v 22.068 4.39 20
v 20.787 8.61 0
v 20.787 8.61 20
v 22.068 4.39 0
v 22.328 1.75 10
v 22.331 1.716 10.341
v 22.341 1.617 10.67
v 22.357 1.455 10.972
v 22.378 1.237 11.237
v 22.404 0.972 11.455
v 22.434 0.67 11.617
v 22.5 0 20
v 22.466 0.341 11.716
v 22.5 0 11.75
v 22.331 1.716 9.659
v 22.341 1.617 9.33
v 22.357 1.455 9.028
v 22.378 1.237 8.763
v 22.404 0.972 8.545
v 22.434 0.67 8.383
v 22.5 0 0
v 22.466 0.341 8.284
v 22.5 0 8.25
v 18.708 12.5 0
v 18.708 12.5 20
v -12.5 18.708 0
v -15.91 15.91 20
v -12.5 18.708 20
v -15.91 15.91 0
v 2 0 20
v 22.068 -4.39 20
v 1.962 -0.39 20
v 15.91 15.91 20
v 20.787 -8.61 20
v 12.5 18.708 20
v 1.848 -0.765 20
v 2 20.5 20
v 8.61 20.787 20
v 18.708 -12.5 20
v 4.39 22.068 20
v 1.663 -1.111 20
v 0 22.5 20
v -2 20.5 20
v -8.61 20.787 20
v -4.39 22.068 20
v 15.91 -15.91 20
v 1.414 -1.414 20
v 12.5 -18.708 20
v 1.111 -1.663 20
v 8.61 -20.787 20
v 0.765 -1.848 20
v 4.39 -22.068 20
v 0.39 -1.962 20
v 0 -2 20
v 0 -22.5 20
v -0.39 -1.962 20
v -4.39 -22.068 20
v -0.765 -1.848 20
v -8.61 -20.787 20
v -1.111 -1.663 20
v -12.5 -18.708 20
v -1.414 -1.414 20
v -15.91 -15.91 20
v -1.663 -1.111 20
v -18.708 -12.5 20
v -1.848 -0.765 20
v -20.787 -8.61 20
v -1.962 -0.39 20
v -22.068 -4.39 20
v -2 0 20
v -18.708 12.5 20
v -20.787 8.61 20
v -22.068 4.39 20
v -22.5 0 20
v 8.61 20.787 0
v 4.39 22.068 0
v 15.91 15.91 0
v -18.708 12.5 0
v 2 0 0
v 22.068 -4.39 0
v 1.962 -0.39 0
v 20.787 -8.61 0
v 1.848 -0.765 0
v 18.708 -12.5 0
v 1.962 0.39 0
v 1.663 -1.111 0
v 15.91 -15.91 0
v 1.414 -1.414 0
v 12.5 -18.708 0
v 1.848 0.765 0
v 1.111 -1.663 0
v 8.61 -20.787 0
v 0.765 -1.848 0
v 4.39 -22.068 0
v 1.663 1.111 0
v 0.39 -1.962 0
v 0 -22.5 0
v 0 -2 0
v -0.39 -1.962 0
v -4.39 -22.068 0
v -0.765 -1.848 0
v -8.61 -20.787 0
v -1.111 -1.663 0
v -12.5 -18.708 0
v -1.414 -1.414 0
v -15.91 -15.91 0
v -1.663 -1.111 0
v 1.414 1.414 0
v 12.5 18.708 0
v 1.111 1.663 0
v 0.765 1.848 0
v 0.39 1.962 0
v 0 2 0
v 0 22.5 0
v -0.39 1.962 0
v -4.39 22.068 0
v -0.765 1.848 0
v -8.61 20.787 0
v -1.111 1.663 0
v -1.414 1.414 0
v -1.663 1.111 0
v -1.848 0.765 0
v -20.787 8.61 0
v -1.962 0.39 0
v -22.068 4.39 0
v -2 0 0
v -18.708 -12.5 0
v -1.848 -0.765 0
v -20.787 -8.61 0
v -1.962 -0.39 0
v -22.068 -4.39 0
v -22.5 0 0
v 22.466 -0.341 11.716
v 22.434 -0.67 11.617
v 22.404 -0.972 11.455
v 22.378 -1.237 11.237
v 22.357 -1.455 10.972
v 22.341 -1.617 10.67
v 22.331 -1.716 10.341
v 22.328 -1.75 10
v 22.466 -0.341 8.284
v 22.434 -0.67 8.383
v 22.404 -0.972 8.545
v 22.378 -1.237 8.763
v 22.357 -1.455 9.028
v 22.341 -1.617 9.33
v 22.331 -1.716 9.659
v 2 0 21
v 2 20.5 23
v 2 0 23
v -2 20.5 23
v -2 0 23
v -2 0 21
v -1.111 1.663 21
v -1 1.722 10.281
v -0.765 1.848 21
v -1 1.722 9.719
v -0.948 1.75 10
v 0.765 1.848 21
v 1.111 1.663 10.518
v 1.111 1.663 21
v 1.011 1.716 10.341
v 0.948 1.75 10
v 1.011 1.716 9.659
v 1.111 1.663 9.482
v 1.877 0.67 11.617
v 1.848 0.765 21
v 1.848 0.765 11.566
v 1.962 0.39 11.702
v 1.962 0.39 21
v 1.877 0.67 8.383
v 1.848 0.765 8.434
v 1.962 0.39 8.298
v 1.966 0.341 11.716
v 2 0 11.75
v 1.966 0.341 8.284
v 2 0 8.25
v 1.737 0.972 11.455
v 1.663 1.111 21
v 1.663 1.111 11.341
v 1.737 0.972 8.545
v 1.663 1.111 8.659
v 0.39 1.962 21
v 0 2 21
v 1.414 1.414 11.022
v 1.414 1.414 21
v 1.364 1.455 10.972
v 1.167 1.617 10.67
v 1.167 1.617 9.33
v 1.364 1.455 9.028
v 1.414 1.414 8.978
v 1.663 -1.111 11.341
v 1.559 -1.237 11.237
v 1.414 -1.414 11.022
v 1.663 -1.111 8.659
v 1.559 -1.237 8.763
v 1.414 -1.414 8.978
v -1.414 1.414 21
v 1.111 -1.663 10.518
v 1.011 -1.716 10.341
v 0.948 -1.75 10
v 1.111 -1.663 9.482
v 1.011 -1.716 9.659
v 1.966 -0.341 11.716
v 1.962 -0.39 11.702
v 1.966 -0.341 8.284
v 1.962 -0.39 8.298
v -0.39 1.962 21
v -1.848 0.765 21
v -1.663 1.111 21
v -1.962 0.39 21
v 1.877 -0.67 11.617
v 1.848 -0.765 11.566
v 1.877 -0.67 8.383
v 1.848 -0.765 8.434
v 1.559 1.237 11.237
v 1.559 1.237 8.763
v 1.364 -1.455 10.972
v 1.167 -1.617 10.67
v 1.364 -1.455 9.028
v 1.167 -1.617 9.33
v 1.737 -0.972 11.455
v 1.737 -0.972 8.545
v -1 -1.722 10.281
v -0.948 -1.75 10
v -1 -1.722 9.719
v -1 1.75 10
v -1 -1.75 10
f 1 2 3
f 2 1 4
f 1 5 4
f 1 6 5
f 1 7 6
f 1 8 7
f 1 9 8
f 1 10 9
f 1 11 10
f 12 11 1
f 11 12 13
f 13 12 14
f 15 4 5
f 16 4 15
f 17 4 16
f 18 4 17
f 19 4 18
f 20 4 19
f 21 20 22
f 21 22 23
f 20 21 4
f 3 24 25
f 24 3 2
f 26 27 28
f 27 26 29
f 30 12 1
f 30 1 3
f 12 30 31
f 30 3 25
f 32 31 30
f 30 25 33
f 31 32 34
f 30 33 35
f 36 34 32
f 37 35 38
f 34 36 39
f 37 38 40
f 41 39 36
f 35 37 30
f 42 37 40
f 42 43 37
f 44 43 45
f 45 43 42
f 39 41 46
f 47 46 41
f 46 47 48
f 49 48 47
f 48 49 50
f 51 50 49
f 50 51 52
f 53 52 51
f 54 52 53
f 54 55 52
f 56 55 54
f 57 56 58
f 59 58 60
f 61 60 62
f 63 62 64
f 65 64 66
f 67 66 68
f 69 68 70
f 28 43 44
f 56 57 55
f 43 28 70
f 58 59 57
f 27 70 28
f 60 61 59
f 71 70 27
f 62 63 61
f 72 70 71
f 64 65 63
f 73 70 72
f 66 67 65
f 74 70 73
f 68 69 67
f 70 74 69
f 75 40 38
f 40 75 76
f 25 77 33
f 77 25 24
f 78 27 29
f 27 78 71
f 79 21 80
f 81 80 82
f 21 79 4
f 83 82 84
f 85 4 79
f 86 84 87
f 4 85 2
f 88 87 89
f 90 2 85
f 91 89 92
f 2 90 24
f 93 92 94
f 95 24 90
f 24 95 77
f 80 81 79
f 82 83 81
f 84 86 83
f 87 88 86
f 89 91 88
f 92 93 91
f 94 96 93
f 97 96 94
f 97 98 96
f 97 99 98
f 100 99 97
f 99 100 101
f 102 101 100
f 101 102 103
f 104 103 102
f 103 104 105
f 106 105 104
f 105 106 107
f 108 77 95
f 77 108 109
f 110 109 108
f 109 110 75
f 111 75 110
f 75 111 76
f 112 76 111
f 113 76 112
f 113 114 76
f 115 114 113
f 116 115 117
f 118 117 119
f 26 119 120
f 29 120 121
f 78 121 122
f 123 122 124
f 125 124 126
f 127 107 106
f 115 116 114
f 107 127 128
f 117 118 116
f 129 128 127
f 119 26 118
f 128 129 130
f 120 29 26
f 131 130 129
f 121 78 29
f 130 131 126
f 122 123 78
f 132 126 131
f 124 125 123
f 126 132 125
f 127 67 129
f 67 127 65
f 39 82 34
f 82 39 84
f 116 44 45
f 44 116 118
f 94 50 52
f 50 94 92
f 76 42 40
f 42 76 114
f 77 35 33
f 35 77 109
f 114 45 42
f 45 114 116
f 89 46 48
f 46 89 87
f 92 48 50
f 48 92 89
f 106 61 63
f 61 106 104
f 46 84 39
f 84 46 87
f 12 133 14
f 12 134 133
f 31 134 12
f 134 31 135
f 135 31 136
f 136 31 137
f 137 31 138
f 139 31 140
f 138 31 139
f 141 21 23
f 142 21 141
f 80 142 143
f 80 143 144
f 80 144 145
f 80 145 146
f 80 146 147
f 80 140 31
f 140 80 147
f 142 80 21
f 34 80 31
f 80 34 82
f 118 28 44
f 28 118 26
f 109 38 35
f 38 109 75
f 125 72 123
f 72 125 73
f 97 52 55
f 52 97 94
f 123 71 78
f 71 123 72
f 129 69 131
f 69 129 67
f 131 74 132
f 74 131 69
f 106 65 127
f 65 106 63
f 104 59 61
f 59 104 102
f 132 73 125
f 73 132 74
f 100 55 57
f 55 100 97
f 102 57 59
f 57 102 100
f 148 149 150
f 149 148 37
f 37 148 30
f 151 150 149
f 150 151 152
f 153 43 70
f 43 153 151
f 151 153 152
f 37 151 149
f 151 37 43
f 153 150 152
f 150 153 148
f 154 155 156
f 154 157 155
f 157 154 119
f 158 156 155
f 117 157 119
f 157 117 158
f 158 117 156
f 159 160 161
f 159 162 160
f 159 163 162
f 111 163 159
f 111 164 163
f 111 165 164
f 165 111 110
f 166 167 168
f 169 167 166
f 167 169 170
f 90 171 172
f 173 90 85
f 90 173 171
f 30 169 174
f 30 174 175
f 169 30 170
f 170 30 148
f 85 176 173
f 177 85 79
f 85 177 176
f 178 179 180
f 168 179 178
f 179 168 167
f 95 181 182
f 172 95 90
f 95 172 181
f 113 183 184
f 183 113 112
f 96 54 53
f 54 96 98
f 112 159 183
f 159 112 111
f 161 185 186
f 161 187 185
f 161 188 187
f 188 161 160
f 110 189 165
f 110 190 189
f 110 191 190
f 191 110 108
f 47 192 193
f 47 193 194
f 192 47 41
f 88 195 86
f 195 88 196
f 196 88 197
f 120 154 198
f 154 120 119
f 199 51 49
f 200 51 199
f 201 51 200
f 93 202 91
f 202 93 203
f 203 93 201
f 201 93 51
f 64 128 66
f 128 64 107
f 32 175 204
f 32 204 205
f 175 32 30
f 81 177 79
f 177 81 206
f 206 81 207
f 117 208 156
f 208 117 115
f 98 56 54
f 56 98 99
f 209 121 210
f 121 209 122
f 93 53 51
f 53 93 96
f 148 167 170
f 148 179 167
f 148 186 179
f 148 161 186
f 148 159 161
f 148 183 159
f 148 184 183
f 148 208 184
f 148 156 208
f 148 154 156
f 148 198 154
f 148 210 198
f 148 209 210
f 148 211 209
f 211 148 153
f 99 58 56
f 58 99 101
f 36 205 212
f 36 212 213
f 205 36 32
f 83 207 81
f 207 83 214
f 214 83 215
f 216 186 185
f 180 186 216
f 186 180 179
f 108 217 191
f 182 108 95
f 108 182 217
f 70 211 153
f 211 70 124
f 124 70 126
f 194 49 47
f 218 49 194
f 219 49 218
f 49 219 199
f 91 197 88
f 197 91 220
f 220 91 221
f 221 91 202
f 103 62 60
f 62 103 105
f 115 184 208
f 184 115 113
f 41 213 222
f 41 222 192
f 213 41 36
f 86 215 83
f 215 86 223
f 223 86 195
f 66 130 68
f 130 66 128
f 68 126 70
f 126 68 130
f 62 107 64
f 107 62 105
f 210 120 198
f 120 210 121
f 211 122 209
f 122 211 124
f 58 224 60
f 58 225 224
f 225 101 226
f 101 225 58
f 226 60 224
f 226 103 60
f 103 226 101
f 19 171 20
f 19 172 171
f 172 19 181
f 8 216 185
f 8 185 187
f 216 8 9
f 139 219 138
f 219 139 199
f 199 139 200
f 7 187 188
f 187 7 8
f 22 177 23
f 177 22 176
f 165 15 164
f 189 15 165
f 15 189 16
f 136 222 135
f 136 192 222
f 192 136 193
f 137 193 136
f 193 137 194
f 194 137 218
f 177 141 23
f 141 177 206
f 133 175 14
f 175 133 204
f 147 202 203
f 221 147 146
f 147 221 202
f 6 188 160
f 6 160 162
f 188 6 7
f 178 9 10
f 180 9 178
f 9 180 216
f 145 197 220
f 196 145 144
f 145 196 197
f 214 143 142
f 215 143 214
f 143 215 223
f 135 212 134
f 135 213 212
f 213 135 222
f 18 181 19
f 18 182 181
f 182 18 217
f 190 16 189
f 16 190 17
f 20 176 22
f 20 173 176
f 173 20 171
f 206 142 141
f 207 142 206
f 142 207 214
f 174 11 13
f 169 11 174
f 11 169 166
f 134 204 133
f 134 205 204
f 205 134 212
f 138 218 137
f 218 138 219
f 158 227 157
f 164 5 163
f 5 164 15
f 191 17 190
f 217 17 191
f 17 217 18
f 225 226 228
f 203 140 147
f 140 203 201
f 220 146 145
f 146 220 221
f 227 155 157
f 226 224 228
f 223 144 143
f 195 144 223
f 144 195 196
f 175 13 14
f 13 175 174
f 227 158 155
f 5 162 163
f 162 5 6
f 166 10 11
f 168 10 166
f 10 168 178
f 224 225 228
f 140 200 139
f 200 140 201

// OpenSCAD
$fn = 32;

// ----------------------------------------------------------------------
// Control knob: pointer knob
// ----------------------------------------------------------------------

// --- parameters (mm) ---
rib_w = 4;                // pointer rib width
rib_h = 4;                // pointer rib height
knob_d = 45;              // knob body diameter
knob_h = 20;              // knob body height
bore_d = 4;               // shaft bore diameter
set_d = 3.5;              // set screw bore diameter

rib_poke = rib_h - 1;  // rib height above the top
total_h = knob_h + rib_h - 1;  // overall height

difference() {
  union() {
    cylinder(h = knob_h, d = knob_d);
    translate([-rib_w / 2, 0, knob_h - 1])
      cube([rib_w, knob_d / 2 - 2, rib_h]);
  }
  translate([0, 0, -1]) cylinder(h = knob_h + 2, d = bore_d);
  translate([-1, 0, knob_h / 2]) rotate([0, 90, 0])
    cylinder(h = knob_d / 2 + bore_d / 2 + 2, d = set_d);}
